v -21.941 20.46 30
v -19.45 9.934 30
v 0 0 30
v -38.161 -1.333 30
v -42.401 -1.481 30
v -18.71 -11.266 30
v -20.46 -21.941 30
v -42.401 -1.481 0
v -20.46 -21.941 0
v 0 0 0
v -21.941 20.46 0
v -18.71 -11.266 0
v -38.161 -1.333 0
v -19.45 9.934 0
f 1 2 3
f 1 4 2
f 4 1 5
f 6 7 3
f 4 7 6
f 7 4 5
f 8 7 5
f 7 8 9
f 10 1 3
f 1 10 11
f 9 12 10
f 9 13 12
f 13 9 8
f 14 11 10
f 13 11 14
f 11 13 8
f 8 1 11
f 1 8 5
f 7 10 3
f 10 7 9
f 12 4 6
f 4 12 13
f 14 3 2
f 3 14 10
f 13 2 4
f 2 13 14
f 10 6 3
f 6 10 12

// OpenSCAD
rotate([0,0,92])
rotate([0,-90,0]){
    difference(){
        rotate([-45,0,0]) {
            cube([30, 30, 30]);
        }
        scale([1,0.9,0.5]) {
            rotate([-45,0,0]) {
                cube([30, 30, 30]);
            }
        }
    }
}
